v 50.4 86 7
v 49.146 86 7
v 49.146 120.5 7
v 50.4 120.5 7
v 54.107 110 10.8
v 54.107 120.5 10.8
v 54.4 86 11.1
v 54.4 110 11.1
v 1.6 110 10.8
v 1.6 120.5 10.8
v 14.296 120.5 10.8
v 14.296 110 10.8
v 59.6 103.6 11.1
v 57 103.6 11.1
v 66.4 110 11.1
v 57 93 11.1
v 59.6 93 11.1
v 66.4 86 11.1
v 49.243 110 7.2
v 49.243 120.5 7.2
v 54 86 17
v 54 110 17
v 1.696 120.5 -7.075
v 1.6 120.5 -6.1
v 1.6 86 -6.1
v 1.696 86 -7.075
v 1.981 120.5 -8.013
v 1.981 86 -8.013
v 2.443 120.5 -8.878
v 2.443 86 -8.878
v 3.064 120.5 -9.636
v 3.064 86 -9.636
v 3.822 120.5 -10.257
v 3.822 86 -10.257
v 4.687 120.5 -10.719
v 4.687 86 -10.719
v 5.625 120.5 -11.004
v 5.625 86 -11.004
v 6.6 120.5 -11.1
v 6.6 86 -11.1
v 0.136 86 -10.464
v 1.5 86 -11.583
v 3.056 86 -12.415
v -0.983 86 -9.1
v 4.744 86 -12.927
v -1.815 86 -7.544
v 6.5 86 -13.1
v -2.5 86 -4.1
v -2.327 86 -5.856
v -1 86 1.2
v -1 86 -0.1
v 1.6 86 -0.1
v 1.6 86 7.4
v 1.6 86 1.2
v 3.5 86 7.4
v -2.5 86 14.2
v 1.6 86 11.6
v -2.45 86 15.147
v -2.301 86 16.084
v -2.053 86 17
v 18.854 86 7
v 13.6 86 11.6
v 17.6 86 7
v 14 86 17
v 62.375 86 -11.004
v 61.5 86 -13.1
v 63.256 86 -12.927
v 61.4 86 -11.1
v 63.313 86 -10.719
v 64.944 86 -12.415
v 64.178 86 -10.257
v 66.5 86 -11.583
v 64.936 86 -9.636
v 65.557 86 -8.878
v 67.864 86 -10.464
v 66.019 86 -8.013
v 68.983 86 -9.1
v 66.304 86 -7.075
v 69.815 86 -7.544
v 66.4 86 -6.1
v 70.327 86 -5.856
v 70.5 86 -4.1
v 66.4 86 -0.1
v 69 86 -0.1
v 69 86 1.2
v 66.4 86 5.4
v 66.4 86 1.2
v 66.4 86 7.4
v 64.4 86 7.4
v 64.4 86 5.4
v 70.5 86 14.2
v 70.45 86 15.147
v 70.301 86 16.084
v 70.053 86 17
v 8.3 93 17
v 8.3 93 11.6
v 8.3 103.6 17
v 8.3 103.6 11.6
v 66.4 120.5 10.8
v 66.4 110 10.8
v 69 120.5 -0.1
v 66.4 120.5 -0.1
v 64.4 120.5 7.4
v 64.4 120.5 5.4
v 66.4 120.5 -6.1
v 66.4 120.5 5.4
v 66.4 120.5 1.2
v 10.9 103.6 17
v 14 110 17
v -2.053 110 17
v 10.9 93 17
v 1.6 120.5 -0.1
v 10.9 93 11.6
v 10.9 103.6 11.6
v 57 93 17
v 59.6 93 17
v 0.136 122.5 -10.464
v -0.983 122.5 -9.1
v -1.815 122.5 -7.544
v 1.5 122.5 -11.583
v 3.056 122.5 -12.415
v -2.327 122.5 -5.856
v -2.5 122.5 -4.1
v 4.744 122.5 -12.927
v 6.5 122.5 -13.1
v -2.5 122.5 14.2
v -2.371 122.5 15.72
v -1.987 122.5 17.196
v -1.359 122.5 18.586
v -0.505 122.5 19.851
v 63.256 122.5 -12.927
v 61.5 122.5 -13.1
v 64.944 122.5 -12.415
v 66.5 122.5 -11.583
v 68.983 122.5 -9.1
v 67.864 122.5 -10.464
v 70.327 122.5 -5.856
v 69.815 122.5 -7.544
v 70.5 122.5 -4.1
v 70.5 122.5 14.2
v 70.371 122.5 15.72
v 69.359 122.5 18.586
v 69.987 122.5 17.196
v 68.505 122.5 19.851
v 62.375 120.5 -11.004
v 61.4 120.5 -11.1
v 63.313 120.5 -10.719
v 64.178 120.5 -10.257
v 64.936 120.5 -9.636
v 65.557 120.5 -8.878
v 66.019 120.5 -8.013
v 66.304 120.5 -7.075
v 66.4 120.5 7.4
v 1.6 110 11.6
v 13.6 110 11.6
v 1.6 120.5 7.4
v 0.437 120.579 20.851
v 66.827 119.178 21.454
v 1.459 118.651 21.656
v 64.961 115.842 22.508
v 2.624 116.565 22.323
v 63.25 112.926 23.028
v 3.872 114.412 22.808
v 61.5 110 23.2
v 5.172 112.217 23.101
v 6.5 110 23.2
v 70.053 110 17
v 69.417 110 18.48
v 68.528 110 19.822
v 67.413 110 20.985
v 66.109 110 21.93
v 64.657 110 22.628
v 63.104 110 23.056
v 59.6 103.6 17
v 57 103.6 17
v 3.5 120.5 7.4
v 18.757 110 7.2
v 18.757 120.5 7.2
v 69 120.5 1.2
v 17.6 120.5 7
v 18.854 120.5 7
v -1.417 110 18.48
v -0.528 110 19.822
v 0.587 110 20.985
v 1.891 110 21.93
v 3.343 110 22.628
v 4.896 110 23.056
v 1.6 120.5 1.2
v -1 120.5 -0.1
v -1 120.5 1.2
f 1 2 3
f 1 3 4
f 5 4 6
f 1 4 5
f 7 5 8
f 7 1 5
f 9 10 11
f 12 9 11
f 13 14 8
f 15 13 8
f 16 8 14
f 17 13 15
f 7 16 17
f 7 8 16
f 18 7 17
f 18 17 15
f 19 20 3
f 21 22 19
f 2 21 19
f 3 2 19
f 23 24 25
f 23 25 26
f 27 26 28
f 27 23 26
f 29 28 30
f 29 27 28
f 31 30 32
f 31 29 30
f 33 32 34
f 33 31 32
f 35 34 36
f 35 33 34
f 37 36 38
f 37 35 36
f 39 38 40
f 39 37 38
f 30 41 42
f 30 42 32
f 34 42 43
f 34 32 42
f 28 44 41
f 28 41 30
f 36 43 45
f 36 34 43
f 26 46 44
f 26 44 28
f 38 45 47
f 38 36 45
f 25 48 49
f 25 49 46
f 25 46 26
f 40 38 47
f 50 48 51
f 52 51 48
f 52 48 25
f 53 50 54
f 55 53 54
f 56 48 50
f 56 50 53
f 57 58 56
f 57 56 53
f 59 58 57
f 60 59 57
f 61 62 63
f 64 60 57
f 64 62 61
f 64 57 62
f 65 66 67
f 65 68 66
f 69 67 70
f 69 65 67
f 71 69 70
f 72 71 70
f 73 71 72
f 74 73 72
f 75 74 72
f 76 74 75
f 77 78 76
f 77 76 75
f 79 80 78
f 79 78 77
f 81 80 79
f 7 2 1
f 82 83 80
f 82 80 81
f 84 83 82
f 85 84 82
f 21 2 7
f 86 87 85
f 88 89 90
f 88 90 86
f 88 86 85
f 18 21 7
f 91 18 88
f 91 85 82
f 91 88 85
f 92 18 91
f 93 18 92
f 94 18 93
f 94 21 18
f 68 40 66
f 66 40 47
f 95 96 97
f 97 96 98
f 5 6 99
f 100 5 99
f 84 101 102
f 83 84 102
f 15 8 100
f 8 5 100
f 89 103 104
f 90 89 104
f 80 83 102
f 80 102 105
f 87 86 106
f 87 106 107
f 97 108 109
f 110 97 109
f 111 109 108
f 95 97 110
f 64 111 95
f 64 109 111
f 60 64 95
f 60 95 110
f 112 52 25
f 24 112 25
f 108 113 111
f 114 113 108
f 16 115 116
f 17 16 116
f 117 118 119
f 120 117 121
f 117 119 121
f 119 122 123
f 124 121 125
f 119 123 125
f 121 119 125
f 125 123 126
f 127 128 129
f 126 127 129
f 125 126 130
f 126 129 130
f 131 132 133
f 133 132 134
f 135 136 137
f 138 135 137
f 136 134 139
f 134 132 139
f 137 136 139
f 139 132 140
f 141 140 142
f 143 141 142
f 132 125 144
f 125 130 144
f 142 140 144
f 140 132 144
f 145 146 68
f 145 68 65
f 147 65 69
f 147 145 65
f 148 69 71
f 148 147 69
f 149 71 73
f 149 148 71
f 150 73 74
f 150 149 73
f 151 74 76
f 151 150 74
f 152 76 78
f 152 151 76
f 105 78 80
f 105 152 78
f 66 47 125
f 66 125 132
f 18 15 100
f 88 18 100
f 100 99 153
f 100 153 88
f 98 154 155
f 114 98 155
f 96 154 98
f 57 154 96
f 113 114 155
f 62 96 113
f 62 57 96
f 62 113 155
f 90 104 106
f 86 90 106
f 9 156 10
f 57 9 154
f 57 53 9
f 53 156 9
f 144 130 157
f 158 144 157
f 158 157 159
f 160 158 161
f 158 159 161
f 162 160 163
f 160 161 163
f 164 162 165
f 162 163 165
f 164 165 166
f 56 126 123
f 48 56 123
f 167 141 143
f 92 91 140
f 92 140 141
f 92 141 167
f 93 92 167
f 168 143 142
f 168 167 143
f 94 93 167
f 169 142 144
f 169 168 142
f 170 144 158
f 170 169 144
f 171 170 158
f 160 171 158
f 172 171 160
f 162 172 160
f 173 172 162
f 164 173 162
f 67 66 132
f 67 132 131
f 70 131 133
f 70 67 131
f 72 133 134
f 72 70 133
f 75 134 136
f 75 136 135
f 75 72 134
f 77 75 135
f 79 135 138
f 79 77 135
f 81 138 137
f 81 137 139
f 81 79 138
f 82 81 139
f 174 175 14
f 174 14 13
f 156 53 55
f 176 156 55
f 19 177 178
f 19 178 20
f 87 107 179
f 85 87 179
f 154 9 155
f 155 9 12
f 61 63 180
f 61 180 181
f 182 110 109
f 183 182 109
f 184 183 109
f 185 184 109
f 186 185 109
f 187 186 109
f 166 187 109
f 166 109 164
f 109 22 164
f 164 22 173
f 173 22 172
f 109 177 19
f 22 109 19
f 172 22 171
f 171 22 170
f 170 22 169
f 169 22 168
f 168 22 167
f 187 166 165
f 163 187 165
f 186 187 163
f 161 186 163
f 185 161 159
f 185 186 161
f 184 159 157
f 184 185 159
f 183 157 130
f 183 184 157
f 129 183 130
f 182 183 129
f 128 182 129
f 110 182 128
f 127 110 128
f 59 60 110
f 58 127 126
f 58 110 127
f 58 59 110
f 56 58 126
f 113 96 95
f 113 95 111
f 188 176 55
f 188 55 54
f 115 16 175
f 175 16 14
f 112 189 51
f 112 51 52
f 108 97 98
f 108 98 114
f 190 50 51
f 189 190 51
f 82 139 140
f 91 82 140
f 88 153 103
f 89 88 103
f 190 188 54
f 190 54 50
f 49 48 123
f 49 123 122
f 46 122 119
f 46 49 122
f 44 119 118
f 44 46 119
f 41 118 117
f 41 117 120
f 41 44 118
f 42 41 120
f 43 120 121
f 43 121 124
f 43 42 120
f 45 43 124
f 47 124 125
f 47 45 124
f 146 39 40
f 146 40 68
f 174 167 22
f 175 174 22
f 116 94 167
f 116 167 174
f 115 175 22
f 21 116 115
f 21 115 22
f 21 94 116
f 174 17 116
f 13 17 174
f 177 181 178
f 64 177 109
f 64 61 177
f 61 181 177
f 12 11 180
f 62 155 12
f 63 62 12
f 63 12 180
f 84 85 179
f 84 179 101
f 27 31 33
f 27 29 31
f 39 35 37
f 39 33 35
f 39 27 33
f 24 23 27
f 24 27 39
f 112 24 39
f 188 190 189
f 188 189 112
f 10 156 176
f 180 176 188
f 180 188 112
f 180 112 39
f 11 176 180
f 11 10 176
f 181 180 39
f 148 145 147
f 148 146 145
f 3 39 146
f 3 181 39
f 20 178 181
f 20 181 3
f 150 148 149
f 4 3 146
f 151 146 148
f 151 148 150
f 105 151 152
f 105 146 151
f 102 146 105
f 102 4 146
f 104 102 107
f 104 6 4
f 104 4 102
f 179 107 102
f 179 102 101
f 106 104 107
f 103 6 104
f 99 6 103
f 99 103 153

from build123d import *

# Parameters (mm, degrees)
BOX021_W                             = 2.6
BOX021_H                             = 10.6
BOX021_DEPTH                         = 15
BOX020_W                             = 2.6
BOX020_H                             = 10.6
BOX020_DEPTH                         = 15
EXTRUDE056_DEPTH                     = 34.5
EXTRUDE056_ONTO_SKETCH076_ROLL_ANGLE = 90
EXTRUDE055_DEPTH                     = 34.5
EXTRUDE055_ONTO_SKETCH075_ROLL_ANGLE = 90
EXTRUDE057_DEPTH                     = 10.5
EXTRUDE057_ONTO_SKETCH077_ROLL_ANGLE = 90
EXTRUDE060_DEPTH                     = 100
EXTRUDE059_DEPTH                     = 2
EXTRUDE059_ONTO_SKETCH079_ROLL_ANGLE = 90
BOX026_W                             = 80
BOX026_H                             = 28
BOX026_DEPTH                         = 30
EXTRUDE058_DEPTH                     = 35.5
EXTRUDE058_ONTO_SKETCH078_ROLL_ANGLE = 90


with BuildPart() as control_cutout_rec002:
    # Box021 → Box021 (new body)
    with BuildSketch(Plane(origin=(57, 93, 9), x_dir=(1, 0, 0), z_dir=(0, 0, 1))):
        with Locations((1.3, 5.3)):
            Rectangle(BOX021_W, BOX021_H)
    extrude(amount=BOX021_DEPTH)


with BuildPart() as button_cutouts_rec:
    # Box020 → Box020 (new body)
    with BuildSketch(Plane(origin=(8.3, 93, 9), x_dir=(1, 0, 0), z_dir=(0, 0, 1))):
        with Locations((1.3, 5.3)):
            Rectangle(BOX020_W, BOX020_H)
    extrude(amount=BOX020_DEPTH)

    # Fusion034: union control_cutout_rec002
    add(control_cutout_rec002.part)


with BuildPart() as screen_cutout_shp001:
    # Sketch076 as drawn → Extrude056 (new)
    with BuildSketch(Plane.XY):
        Polygon((14, 17), (-5.5, 17), (-5.5, 25.6), (73.5, 25.6), (73.5, 17), (54, 17), (49, 6.7), (49, 6.6), (19, 6.6), (19, 6.7), align=None)
    extrude(amount=-EXTRUDE056_DEPTH)


with BuildPart() as screen_cutout_shp001_1:
    # Extrude056 onto Sketch076 roll: moved
    add(screen_cutout_shp001.part.rotate(Axis((0, 0, 0), (1, 0, 0)), EXTRUDE056_ONTO_SKETCH076_ROLL_ANGLE))


with BuildPart() as screen_cutout_shp001_2:
    # Extrude056 onto Sketch076 placement: moved
    add(screen_cutout_shp001_1.part.moved(Location((0, 86, 0))))


with BuildPart() as screen_frame001:
    # Sketch075 as drawn → Extrude055 (new)
    with BuildSketch(Plane.XY):
        with BuildLine():
            Line((-2.5, 14.2), (-2.5, 10.6))
            Line((-2.5, 10.6), (1.6, 10.6))
            Line((1.6, 10.6), (1.6, 11.6))
            Line((1.6, 11.6), (13.6, 11.6))
            Line((13.6, 11.6), (17.6, 7))
            Line((17.6, 7), (50.4, 7))
            Line((50.4, 7), (54.4, 11.1))
            Line((54.4, 11.1), (66.4, 11.1))
            Line((66.4, 11.1), (66.4, 10.6))
            Line((66.4, 10.6), (70.5, 10.6))
            Line((70.5, 10.6), (70.5, 14.2))
            ThreePointArc((70.5, 14.2), (67.863961, 20.563961), (61.5, 23.2))
            Line((6.5, 23.2), (61.5, 23.2))
            ThreePointArc((6.5, 23.2), (0.136039, 20.563961), (-2.5, 14.2))
        make_face()
    extrude(amount=-EXTRUDE055_DEPTH)


with BuildPart() as screen_frame001_1:
    # Extrude055 onto Sketch075 roll: moved
    add(screen_frame001.part.rotate(Axis((0, 0, 0), (1, 0, 0)), EXTRUDE055_ONTO_SKETCH075_ROLL_ANGLE))


with BuildPart() as screen_frame001_2:
    # Extrude055 onto Sketch075 placement: moved
    add(screen_frame001_1.part.moved(Location((0, 86, 0))))

    # Cut022: cut screen_cutout_shp001
    add(screen_cutout_shp001_2.part, mode=Mode.SUBTRACT)


with BuildPart() as cut023:
    # Sketch077 as drawn → Extrude057 (new)
    with BuildSketch(Plane.XY):
        Polygon((13.6, 12.2), (17.6, 7.2), (50.4, 7.2), (54.4, 12.2), align=None)
    extrude(amount=-EXTRUDE057_DEPTH)


with BuildPart() as cut023_1:
    # Extrude057 onto Sketch077 roll: moved
    add(cut023.part.rotate(Axis((0, 0, 0), (1, 0, 0)), EXTRUDE057_ONTO_SKETCH077_ROLL_ANGLE))


with BuildPart() as cut023_2:
    # Extrude057 onto Sketch077 placement: moved
    add(cut023_1.part.moved(Location((0, 110, 0))))

    # Fusion035: union screen_frame001
    add(screen_frame001_2.part)

    # Cut023: cut button_cutouts_rec
    add(button_cutouts_rec.part, mode=Mode.SUBTRACT)


with BuildPart() as round_cut001:
    # Sketch080 → Extrude060 (new body)
    with BuildSketch(Plane.YZ.offset(-14)):
        with BuildLine():
            Line((100, 23.2), (100, 26.2))
            Line((100, 26.2), (138, 26.2))
            Line((138, 26.2), (138, -11.8))
            Line((138, -11.8), (135, -11.8))
            Line((135, -11.8), (135, -1.8))
            ThreePointArc((135, -1.8), (127.67767, 15.87767), (110, 23.2))
            Line((100, 23.2), (110, 23.2))
        make_face()
    extrude(amount=EXTRUDE060_DEPTH)


with BuildPart() as extrude059:
    # Sketch079 as drawn → Extrude059 (new)
    with BuildSketch(Plane.XY):
        with BuildLine():
            Line((-2.5, 14.2), (-2.5, -4.1))
            ThreePointArc((-2.5, -4.1), (0.136039, -10.463961), (6.5, -13.1))
            Line((6.5, -13.1), (61.5, -13.1))
            ThreePointArc((61.5, -13.1), (67.863961, -10.463961), (70.5, -4.1))
            Line((70.5, -4.1), (70.5, 14.2))
            ThreePointArc((70.5, 14.2), (67.863961, 20.563961), (61.5, 23.2))
            Line((6.5, 23.2), (61.5, 23.2))
            ThreePointArc((6.5, 23.2), (0.136039, 20.563961), (-2.5, 14.2))
        make_face()
    extrude(amount=-EXTRUDE059_DEPTH)


with BuildPart() as extrude059_1:
    # Extrude059 onto Sketch079 roll: moved
    add(extrude059.part.rotate(Axis((0, 0, 0), (1, 0, 0)), EXTRUDE059_ONTO_SKETCH079_ROLL_ANGLE))


with BuildPart() as extrude059_2:
    # Extrude059 onto Sketch079 placement: moved
    add(extrude059_1.part.moved(Location((0, 120, 0))))


with BuildPart() as extrude059_3:
    # Extrude059 placement: moved
    add(extrude059_2.part.moved(Location((0, 0.5, 0))))


with BuildPart() as cube007:
    # Box026 → Box026 (new body)
    with BuildSketch(Plane(origin=(-5, 82, 10.6), x_dir=(1, 0, 0), z_dir=(0, 0, 1))):
        with Locations((40, 14)):
            Rectangle(BOX026_W, BOX026_H)
    extrude(amount=BOX026_DEPTH)


with BuildPart() as shell_upper:
    # Sketch078 as drawn → Extrude058 (new)
    with BuildSketch(Plane.XY):
        with BuildLine():
            Line((-2.5, 14.2), (-2.5, -4.1))
            ThreePointArc((-2.5, -4.1), (0.136039, -10.463961), (6.5, -13.1))
            Line((6.5, -13.1), (61.5, -13.1))
            ThreePointArc((61.5, -13.1), (67.863961, -10.463961), (70.5, -4.1))
            Line((70.5, -4.1), (70.5, 14.2))
            ThreePointArc((70.5, 14.2), (67.863961, 20.563961), (61.5, 23.2))
            Line((6.5, 23.2), (61.5, 23.2))
            ThreePointArc((6.5, 23.2), (0.136039, 20.563961), (-2.5, 14.2))
        make_face()
        with BuildLine():
            Line((1.6, 1.2), (-1, 1.2))
            Line((-1, 1.2), (-1, -0.1))
            Line((-1, -0.1), (1.6, -0.1))
            Line((1.6, -0.1), (1.6, -6.1))
            ThreePointArc((1.6, -6.1), (3.064466, -9.635534), (6.6, -11.1))
            Line((6.6, -11.1), (61.4, -11.1))
            ThreePointArc((61.4, -11.1), (64.935534, -9.635534), (66.4, -6.1))
            Line((66.4, -0.1), (66.4, -6.1))
            Line((69, -0.1), (66.4, -0.1))
            Line((69, 1.2), (69, -0.1))
            Line((66.4, 1.2), (69, 1.2))
            Line((66.4, 5.4), (66.4, 1.2))
            Line((64.4, 5.4), (66.4, 5.4))
            Line((64.4, 7.4), (64.4, 5.4))
            Line((66.4, 7.4), (64.4, 7.4))
            Line((66.4, 10.6), (66.4, 7.4))
            Line((66.4, 10.6), (66.4, 10.8))
            Line((66.4, 10.8), (64.5, 10.8))
            Line((64.5, 10.8), (3.5, 10.8))
            Line((1.6, 10.8), (3.5, 10.8))
            Line((1.6, 10.6), (1.6, 10.8))
            Line((1.6, 10.6), (1.6, 7.4))
            Line((1.6, 7.4), (3.5, 7.4))
            Line((3.5, 7.4), (1.6, 1.2))
        make_face(mode=Mode.SUBTRACT)
    extrude(amount=EXTRUDE058_DEPTH)


with BuildPart() as shell_upper_1:
    # Extrude058 onto Sketch078 roll: moved
    add(shell_upper.part.rotate(Axis((0, 0, 0), (1, 0, 0)), EXTRUDE058_ONTO_SKETCH078_ROLL_ANGLE))


with BuildPart() as shell_upper_2:
    # Extrude058 onto Sketch078 placement: moved
    add(shell_upper_1.part.moved(Location((0, 120, 0))))


with BuildPart() as shell_upper_3:
    # Extrude058 placement: moved
    add(shell_upper_2.part.moved(Location((0, 1.5, 0))))

    # Cut024: cut Cube007
    add(cube007.part, mode=Mode.SUBTRACT)

    # Fusion038: union Extrude059
    add(extrude059_3.part)

    # Cut025: cut round_cut001
    add(round_cut001.part, mode=Mode.SUBTRACT)

    # Fusion039: union Cut023
    add(cut023_2.part)


solid = shell_upper_3.part
